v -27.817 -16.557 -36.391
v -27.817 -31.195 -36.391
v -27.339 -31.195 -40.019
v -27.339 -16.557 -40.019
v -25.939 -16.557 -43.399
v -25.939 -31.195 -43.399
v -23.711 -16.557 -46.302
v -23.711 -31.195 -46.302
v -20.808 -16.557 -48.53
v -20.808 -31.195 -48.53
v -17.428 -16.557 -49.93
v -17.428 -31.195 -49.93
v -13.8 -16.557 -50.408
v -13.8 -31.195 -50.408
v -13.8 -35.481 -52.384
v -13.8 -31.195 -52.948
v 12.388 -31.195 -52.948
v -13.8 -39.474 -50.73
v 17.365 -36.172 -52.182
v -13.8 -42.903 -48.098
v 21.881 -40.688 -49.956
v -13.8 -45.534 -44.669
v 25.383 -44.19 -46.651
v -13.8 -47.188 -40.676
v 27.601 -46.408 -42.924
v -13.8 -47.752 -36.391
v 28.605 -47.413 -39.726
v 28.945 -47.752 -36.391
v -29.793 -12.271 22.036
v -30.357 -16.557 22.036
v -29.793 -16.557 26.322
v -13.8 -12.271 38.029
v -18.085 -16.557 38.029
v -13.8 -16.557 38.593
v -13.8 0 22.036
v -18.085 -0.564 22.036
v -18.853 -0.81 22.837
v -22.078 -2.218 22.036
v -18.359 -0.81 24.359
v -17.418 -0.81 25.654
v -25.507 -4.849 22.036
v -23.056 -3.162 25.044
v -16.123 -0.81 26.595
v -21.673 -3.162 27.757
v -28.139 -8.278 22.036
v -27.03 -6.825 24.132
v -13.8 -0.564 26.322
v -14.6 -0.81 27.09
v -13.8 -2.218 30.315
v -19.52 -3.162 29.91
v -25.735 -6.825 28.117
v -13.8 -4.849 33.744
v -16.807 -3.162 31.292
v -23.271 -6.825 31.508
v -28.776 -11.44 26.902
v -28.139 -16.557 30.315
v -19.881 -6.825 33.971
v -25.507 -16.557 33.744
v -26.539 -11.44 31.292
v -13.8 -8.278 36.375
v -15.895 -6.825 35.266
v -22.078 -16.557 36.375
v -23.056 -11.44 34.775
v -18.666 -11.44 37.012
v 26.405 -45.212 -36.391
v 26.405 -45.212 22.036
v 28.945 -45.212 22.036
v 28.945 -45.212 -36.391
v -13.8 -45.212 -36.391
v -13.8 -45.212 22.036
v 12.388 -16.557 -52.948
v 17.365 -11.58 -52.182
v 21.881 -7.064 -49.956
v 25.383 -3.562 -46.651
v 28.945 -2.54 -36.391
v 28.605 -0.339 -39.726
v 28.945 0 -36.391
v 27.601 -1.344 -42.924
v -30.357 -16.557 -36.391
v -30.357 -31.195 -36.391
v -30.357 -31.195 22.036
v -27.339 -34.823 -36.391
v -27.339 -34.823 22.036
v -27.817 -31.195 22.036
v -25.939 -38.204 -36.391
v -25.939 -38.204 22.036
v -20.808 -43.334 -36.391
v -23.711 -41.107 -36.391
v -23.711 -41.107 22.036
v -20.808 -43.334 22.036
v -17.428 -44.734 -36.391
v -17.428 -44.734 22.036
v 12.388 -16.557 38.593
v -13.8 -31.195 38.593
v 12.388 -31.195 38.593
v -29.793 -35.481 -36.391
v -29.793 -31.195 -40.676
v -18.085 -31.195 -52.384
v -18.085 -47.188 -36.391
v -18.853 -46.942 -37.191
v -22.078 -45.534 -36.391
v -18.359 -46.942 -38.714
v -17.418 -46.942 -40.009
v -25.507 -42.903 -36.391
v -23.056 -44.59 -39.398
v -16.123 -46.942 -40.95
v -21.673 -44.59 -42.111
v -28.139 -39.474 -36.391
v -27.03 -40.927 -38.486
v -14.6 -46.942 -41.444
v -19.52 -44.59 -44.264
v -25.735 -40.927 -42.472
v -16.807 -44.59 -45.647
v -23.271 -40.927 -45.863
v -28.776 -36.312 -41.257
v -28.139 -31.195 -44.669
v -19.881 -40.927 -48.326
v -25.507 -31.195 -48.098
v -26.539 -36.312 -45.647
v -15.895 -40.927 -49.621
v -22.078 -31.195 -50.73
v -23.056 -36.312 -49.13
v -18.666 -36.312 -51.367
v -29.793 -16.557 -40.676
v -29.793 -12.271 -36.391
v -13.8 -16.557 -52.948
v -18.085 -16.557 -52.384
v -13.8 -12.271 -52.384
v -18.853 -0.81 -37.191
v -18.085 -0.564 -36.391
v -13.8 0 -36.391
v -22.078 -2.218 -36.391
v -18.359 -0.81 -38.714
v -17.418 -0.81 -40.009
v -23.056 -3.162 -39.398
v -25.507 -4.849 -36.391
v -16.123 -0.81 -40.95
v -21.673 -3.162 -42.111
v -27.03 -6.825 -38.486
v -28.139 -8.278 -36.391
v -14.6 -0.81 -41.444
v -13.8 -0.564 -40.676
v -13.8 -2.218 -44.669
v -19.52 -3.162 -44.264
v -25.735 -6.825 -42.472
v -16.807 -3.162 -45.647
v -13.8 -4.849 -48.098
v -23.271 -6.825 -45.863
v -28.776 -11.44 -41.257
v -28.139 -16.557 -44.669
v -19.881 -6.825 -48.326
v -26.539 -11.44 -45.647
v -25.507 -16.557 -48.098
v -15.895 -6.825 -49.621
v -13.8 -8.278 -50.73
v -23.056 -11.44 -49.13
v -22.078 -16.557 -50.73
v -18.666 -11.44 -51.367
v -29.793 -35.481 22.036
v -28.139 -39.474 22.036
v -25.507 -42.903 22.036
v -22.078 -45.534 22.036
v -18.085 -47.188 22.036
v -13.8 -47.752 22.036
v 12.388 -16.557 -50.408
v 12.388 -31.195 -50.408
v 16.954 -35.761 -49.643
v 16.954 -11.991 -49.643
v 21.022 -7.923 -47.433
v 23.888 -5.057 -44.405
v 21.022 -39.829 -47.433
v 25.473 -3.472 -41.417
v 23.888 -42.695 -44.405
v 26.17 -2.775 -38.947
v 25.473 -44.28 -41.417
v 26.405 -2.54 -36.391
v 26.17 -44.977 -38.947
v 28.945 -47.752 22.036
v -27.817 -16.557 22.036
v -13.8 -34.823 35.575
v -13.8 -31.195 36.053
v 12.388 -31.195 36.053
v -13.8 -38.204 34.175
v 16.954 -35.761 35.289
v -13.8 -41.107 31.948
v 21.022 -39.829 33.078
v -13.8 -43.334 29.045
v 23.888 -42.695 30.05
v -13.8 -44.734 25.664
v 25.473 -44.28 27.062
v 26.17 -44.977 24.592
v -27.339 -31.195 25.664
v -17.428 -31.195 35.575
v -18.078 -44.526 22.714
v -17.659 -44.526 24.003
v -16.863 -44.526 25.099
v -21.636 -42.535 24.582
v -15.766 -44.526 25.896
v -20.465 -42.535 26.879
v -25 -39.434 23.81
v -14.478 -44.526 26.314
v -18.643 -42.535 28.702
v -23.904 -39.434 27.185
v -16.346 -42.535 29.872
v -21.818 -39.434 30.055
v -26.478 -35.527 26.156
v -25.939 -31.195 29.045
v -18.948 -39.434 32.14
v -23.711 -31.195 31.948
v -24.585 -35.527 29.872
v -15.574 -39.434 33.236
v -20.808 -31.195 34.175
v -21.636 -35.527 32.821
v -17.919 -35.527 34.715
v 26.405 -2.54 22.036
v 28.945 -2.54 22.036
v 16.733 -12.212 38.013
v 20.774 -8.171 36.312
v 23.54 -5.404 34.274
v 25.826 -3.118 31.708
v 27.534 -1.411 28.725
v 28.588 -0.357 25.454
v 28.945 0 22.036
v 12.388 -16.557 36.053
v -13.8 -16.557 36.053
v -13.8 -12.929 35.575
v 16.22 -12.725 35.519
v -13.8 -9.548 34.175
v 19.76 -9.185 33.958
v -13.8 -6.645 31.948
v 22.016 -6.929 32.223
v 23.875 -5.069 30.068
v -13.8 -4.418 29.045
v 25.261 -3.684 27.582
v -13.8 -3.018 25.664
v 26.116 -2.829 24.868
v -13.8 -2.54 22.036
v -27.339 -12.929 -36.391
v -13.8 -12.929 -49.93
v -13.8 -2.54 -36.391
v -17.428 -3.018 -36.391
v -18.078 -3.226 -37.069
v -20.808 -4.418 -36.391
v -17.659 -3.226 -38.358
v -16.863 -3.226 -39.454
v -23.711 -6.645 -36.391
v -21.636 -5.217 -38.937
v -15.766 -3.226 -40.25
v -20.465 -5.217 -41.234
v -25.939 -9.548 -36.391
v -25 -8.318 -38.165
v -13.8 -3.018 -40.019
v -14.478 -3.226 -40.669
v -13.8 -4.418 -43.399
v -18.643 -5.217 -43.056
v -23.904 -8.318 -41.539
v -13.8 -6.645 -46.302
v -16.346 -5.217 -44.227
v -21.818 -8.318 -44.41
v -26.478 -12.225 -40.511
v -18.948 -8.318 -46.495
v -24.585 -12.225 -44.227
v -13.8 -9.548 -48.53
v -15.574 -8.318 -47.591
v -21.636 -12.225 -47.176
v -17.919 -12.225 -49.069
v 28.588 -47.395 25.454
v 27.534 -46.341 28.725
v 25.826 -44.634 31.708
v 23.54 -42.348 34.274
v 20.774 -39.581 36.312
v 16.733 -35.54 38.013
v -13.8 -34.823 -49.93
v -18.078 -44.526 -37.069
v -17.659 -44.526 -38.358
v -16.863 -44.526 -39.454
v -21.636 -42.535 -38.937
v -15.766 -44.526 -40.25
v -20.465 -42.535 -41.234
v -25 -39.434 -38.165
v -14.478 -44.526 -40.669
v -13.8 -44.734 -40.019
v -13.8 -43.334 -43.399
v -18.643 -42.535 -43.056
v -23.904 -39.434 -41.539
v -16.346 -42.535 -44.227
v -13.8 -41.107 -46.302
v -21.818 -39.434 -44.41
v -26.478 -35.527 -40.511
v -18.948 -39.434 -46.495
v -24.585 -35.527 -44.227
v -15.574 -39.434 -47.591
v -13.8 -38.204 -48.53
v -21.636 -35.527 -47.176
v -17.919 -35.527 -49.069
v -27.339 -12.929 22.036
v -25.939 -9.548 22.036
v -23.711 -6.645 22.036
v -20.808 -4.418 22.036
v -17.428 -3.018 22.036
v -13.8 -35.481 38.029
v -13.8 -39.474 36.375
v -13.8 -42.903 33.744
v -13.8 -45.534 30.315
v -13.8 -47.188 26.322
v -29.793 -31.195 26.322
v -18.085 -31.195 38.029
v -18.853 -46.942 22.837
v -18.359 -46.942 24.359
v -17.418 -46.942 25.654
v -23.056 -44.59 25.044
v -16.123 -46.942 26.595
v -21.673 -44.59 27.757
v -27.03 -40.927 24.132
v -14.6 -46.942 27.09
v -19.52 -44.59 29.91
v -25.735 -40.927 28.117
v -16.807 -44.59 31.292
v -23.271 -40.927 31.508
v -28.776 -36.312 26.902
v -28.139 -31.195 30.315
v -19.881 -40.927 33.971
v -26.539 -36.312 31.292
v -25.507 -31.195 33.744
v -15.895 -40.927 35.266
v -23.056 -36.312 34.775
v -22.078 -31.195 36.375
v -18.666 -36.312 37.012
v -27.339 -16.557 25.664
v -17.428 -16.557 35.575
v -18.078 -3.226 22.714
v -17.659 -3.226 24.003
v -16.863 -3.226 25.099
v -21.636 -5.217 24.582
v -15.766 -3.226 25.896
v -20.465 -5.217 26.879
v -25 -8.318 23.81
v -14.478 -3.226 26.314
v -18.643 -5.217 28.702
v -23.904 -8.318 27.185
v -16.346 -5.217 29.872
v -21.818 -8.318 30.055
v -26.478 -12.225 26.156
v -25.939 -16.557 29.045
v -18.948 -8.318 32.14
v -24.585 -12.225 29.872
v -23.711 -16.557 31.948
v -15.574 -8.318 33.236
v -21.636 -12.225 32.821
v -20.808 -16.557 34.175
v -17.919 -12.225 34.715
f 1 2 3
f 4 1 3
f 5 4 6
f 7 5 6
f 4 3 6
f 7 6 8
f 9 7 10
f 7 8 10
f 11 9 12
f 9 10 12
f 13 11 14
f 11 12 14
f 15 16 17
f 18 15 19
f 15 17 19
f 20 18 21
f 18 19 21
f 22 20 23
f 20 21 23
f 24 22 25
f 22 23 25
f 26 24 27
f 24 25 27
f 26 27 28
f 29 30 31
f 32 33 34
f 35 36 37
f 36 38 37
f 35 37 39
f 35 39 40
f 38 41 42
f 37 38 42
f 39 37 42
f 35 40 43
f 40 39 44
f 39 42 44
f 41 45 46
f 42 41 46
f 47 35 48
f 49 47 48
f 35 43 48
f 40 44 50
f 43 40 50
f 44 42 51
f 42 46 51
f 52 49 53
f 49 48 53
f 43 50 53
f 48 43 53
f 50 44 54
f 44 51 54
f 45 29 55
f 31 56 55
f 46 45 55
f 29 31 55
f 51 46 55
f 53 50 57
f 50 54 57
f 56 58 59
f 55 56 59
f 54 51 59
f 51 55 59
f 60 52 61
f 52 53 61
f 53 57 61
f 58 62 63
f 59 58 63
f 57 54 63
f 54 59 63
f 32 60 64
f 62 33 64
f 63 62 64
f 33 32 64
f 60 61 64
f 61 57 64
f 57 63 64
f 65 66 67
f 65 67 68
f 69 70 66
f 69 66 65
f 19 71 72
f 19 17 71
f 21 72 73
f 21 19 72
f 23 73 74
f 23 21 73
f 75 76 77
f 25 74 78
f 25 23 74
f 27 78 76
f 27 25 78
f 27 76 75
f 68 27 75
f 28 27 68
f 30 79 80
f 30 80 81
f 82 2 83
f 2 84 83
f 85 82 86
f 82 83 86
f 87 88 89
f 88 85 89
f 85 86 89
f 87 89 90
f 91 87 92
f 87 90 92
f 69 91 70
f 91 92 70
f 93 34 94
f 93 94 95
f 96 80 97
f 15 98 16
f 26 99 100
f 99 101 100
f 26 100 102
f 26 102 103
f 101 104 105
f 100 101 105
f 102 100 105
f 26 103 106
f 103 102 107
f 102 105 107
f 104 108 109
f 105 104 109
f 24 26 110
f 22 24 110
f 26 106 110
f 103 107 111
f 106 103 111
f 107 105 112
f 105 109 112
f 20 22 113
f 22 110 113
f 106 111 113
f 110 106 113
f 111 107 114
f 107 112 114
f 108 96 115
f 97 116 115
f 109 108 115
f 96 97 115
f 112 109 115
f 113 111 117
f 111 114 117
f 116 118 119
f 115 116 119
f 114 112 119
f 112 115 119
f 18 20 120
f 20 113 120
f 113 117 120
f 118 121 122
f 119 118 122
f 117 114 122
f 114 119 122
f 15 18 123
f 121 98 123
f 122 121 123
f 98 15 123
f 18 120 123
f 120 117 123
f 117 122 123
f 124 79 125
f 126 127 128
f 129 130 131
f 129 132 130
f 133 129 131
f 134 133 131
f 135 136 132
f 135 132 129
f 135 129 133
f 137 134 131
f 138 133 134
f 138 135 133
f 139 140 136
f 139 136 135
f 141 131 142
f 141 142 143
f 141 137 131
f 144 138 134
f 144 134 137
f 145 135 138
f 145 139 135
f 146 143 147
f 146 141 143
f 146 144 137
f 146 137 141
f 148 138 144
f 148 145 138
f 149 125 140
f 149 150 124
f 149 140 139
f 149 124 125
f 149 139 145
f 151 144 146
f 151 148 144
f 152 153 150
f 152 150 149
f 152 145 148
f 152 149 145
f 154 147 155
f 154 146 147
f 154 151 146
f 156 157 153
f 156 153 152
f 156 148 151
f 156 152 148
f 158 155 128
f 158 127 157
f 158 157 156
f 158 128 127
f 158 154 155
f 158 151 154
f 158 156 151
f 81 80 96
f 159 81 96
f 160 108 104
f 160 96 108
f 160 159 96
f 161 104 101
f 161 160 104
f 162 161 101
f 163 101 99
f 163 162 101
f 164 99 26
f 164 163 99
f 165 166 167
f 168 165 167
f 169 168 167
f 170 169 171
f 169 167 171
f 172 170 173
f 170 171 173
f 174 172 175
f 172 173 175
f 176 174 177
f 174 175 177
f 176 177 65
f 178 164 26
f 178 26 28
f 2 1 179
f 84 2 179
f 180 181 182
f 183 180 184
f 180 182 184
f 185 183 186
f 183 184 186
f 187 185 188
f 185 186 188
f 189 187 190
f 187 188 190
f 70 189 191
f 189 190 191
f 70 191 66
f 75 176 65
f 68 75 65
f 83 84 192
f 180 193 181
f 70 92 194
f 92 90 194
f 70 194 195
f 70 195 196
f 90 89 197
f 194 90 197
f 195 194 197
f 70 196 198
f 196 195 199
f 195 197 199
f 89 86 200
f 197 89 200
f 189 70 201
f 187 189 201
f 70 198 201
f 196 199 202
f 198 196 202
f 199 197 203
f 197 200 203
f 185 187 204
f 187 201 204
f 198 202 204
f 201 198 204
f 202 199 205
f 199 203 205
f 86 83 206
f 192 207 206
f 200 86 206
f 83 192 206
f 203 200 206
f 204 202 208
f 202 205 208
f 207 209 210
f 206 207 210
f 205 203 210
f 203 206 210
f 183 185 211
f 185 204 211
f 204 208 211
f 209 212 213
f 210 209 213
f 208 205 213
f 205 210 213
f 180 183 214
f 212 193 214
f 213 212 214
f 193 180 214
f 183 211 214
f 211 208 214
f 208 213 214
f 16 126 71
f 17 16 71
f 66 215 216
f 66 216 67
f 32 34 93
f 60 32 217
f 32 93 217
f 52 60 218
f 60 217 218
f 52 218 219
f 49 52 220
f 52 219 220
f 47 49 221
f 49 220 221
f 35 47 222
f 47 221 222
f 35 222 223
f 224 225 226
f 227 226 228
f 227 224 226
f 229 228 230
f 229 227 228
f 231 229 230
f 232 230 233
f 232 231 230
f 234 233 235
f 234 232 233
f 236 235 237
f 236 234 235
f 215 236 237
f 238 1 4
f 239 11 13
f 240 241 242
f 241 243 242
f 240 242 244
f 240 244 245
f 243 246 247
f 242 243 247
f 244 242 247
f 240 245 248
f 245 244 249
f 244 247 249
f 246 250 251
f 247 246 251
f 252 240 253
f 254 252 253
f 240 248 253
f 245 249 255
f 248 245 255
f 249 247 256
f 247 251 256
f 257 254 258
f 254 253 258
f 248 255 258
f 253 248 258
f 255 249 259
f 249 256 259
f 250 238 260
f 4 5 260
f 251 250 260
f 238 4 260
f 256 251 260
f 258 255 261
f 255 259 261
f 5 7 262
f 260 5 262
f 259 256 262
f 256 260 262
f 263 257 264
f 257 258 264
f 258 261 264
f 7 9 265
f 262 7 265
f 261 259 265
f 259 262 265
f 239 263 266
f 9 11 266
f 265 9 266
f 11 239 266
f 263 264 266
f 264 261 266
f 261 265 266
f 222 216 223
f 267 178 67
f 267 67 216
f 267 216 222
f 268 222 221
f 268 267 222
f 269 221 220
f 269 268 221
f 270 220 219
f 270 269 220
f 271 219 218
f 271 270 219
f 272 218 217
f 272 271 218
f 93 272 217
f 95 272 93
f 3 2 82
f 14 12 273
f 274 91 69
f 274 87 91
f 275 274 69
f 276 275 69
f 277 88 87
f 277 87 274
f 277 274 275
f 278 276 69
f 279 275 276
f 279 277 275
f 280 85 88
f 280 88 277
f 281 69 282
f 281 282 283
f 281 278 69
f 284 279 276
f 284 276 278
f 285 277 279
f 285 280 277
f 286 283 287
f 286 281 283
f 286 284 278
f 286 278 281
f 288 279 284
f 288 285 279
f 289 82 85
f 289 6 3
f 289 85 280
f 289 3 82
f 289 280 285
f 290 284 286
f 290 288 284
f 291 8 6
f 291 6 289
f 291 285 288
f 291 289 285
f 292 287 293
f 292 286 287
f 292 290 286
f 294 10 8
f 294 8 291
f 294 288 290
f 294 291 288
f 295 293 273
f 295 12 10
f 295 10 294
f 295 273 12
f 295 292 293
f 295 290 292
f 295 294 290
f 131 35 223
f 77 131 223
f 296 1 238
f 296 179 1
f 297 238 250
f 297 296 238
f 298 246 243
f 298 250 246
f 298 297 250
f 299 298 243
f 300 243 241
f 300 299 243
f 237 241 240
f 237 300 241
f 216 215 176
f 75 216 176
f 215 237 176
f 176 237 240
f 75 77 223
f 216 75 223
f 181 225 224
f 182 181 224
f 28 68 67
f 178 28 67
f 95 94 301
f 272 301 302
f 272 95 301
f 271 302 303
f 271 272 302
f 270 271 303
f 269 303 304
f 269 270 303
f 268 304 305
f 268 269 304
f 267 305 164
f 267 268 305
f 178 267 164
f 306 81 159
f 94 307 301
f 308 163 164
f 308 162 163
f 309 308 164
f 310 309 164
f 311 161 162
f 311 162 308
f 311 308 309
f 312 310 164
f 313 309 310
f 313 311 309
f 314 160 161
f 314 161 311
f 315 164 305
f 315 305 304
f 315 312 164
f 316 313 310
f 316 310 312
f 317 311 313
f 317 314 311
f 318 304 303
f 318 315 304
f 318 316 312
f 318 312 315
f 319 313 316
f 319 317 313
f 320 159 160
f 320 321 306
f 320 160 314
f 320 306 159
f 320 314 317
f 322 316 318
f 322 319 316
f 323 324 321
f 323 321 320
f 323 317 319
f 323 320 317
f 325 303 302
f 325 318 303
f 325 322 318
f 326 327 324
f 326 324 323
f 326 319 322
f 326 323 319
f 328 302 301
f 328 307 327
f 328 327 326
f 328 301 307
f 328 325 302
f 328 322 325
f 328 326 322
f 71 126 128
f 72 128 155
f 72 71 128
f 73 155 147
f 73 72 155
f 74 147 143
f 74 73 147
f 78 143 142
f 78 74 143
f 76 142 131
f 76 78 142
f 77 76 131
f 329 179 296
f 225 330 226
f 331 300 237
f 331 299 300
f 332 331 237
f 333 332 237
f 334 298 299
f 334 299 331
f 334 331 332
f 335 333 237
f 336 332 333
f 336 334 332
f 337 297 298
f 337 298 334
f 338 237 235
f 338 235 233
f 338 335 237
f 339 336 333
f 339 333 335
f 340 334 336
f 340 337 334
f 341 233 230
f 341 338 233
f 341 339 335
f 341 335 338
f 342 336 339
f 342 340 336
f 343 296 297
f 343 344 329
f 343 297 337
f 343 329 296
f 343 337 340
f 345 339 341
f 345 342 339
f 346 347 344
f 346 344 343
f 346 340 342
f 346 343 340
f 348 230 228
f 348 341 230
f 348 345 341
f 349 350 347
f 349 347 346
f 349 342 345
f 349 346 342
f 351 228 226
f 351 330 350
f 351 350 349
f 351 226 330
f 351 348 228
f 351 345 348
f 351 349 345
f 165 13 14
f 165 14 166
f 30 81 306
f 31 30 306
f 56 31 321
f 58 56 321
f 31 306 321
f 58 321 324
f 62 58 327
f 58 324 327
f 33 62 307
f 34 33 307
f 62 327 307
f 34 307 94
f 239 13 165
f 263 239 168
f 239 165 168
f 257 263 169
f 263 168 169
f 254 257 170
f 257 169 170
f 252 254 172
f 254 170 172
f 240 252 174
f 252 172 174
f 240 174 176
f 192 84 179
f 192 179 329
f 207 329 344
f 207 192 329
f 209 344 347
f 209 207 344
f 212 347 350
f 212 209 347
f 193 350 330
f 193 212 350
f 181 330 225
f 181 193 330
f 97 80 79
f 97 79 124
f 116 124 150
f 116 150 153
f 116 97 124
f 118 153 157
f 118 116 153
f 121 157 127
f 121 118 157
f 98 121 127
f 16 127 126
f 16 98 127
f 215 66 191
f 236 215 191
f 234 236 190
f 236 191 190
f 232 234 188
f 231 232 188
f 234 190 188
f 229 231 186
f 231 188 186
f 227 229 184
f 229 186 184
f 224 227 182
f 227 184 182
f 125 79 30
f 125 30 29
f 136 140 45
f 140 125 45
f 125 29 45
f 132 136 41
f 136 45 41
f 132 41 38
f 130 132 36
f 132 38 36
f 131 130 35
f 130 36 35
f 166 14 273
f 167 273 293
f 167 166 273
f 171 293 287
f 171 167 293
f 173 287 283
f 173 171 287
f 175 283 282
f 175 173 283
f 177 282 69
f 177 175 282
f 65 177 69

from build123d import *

# Parameters (mm, degrees)
F0_W     = 59.3015290797
F0_H     = 91.5408506989
F1_DEPTH = 47.752
F2_R     = 16.5566766108
F3_T     = -2.54


# Not quite as in the source:
# - a shell that OpenCascade refuses in one call is made with other operations: the cavity is built on its own and cut out


with BuildPart() as f1:
    # F0 (on Front) → F1 (new body)
    with BuildSketch(Plane.XZ):
        with Locations((-0.7059704512, -7.1773678064)):
            Rectangle(F0_W, F0_H)
    extrude(amount=F1_DEPTH)

    # F2
    f2_edges = [f1.edges().sort_by_distance(p)[0] for p in [
        (-30.356735, -23.876, 38.593058),
        (-30.356735, -23.876, -52.947793),
        (-30.356735, 0, -7.177368),
        (-30.356735, -47.752, -7.177368),
        (28.944794, -23.876, -52.947793),
        (-0.70597, 0, -52.947793),
        (-0.70597, -47.752, -52.947793),
        (28.944794, -23.876, 38.593058),
        (-0.70597, 0, 38.593058),
        (-0.70597, -47.752, 38.593058),
    ]]
    fillet(f2_edges, radius=F2_R)

    # F3: a shell. OpenCascade refuses it in one call, so the cavity is built on its own and cut out:
    # the body offset inwards by the wall thickness, plus a prism from it out through each open face.
    f3_core = offset(f1.part, amount=F3_T, mode=Mode.PRIVATE)
    f3_exits = [f3_core.faces().sort_by_distance(p)[0] for p in [
        (26.404794, -23.876, -7.177368),
    ]]
    add(f3_core, mode=Mode.SUBTRACT)
    extrude(f3_exits, amount=-F3_T, mode=Mode.SUBTRACT)


solid = f1.part
